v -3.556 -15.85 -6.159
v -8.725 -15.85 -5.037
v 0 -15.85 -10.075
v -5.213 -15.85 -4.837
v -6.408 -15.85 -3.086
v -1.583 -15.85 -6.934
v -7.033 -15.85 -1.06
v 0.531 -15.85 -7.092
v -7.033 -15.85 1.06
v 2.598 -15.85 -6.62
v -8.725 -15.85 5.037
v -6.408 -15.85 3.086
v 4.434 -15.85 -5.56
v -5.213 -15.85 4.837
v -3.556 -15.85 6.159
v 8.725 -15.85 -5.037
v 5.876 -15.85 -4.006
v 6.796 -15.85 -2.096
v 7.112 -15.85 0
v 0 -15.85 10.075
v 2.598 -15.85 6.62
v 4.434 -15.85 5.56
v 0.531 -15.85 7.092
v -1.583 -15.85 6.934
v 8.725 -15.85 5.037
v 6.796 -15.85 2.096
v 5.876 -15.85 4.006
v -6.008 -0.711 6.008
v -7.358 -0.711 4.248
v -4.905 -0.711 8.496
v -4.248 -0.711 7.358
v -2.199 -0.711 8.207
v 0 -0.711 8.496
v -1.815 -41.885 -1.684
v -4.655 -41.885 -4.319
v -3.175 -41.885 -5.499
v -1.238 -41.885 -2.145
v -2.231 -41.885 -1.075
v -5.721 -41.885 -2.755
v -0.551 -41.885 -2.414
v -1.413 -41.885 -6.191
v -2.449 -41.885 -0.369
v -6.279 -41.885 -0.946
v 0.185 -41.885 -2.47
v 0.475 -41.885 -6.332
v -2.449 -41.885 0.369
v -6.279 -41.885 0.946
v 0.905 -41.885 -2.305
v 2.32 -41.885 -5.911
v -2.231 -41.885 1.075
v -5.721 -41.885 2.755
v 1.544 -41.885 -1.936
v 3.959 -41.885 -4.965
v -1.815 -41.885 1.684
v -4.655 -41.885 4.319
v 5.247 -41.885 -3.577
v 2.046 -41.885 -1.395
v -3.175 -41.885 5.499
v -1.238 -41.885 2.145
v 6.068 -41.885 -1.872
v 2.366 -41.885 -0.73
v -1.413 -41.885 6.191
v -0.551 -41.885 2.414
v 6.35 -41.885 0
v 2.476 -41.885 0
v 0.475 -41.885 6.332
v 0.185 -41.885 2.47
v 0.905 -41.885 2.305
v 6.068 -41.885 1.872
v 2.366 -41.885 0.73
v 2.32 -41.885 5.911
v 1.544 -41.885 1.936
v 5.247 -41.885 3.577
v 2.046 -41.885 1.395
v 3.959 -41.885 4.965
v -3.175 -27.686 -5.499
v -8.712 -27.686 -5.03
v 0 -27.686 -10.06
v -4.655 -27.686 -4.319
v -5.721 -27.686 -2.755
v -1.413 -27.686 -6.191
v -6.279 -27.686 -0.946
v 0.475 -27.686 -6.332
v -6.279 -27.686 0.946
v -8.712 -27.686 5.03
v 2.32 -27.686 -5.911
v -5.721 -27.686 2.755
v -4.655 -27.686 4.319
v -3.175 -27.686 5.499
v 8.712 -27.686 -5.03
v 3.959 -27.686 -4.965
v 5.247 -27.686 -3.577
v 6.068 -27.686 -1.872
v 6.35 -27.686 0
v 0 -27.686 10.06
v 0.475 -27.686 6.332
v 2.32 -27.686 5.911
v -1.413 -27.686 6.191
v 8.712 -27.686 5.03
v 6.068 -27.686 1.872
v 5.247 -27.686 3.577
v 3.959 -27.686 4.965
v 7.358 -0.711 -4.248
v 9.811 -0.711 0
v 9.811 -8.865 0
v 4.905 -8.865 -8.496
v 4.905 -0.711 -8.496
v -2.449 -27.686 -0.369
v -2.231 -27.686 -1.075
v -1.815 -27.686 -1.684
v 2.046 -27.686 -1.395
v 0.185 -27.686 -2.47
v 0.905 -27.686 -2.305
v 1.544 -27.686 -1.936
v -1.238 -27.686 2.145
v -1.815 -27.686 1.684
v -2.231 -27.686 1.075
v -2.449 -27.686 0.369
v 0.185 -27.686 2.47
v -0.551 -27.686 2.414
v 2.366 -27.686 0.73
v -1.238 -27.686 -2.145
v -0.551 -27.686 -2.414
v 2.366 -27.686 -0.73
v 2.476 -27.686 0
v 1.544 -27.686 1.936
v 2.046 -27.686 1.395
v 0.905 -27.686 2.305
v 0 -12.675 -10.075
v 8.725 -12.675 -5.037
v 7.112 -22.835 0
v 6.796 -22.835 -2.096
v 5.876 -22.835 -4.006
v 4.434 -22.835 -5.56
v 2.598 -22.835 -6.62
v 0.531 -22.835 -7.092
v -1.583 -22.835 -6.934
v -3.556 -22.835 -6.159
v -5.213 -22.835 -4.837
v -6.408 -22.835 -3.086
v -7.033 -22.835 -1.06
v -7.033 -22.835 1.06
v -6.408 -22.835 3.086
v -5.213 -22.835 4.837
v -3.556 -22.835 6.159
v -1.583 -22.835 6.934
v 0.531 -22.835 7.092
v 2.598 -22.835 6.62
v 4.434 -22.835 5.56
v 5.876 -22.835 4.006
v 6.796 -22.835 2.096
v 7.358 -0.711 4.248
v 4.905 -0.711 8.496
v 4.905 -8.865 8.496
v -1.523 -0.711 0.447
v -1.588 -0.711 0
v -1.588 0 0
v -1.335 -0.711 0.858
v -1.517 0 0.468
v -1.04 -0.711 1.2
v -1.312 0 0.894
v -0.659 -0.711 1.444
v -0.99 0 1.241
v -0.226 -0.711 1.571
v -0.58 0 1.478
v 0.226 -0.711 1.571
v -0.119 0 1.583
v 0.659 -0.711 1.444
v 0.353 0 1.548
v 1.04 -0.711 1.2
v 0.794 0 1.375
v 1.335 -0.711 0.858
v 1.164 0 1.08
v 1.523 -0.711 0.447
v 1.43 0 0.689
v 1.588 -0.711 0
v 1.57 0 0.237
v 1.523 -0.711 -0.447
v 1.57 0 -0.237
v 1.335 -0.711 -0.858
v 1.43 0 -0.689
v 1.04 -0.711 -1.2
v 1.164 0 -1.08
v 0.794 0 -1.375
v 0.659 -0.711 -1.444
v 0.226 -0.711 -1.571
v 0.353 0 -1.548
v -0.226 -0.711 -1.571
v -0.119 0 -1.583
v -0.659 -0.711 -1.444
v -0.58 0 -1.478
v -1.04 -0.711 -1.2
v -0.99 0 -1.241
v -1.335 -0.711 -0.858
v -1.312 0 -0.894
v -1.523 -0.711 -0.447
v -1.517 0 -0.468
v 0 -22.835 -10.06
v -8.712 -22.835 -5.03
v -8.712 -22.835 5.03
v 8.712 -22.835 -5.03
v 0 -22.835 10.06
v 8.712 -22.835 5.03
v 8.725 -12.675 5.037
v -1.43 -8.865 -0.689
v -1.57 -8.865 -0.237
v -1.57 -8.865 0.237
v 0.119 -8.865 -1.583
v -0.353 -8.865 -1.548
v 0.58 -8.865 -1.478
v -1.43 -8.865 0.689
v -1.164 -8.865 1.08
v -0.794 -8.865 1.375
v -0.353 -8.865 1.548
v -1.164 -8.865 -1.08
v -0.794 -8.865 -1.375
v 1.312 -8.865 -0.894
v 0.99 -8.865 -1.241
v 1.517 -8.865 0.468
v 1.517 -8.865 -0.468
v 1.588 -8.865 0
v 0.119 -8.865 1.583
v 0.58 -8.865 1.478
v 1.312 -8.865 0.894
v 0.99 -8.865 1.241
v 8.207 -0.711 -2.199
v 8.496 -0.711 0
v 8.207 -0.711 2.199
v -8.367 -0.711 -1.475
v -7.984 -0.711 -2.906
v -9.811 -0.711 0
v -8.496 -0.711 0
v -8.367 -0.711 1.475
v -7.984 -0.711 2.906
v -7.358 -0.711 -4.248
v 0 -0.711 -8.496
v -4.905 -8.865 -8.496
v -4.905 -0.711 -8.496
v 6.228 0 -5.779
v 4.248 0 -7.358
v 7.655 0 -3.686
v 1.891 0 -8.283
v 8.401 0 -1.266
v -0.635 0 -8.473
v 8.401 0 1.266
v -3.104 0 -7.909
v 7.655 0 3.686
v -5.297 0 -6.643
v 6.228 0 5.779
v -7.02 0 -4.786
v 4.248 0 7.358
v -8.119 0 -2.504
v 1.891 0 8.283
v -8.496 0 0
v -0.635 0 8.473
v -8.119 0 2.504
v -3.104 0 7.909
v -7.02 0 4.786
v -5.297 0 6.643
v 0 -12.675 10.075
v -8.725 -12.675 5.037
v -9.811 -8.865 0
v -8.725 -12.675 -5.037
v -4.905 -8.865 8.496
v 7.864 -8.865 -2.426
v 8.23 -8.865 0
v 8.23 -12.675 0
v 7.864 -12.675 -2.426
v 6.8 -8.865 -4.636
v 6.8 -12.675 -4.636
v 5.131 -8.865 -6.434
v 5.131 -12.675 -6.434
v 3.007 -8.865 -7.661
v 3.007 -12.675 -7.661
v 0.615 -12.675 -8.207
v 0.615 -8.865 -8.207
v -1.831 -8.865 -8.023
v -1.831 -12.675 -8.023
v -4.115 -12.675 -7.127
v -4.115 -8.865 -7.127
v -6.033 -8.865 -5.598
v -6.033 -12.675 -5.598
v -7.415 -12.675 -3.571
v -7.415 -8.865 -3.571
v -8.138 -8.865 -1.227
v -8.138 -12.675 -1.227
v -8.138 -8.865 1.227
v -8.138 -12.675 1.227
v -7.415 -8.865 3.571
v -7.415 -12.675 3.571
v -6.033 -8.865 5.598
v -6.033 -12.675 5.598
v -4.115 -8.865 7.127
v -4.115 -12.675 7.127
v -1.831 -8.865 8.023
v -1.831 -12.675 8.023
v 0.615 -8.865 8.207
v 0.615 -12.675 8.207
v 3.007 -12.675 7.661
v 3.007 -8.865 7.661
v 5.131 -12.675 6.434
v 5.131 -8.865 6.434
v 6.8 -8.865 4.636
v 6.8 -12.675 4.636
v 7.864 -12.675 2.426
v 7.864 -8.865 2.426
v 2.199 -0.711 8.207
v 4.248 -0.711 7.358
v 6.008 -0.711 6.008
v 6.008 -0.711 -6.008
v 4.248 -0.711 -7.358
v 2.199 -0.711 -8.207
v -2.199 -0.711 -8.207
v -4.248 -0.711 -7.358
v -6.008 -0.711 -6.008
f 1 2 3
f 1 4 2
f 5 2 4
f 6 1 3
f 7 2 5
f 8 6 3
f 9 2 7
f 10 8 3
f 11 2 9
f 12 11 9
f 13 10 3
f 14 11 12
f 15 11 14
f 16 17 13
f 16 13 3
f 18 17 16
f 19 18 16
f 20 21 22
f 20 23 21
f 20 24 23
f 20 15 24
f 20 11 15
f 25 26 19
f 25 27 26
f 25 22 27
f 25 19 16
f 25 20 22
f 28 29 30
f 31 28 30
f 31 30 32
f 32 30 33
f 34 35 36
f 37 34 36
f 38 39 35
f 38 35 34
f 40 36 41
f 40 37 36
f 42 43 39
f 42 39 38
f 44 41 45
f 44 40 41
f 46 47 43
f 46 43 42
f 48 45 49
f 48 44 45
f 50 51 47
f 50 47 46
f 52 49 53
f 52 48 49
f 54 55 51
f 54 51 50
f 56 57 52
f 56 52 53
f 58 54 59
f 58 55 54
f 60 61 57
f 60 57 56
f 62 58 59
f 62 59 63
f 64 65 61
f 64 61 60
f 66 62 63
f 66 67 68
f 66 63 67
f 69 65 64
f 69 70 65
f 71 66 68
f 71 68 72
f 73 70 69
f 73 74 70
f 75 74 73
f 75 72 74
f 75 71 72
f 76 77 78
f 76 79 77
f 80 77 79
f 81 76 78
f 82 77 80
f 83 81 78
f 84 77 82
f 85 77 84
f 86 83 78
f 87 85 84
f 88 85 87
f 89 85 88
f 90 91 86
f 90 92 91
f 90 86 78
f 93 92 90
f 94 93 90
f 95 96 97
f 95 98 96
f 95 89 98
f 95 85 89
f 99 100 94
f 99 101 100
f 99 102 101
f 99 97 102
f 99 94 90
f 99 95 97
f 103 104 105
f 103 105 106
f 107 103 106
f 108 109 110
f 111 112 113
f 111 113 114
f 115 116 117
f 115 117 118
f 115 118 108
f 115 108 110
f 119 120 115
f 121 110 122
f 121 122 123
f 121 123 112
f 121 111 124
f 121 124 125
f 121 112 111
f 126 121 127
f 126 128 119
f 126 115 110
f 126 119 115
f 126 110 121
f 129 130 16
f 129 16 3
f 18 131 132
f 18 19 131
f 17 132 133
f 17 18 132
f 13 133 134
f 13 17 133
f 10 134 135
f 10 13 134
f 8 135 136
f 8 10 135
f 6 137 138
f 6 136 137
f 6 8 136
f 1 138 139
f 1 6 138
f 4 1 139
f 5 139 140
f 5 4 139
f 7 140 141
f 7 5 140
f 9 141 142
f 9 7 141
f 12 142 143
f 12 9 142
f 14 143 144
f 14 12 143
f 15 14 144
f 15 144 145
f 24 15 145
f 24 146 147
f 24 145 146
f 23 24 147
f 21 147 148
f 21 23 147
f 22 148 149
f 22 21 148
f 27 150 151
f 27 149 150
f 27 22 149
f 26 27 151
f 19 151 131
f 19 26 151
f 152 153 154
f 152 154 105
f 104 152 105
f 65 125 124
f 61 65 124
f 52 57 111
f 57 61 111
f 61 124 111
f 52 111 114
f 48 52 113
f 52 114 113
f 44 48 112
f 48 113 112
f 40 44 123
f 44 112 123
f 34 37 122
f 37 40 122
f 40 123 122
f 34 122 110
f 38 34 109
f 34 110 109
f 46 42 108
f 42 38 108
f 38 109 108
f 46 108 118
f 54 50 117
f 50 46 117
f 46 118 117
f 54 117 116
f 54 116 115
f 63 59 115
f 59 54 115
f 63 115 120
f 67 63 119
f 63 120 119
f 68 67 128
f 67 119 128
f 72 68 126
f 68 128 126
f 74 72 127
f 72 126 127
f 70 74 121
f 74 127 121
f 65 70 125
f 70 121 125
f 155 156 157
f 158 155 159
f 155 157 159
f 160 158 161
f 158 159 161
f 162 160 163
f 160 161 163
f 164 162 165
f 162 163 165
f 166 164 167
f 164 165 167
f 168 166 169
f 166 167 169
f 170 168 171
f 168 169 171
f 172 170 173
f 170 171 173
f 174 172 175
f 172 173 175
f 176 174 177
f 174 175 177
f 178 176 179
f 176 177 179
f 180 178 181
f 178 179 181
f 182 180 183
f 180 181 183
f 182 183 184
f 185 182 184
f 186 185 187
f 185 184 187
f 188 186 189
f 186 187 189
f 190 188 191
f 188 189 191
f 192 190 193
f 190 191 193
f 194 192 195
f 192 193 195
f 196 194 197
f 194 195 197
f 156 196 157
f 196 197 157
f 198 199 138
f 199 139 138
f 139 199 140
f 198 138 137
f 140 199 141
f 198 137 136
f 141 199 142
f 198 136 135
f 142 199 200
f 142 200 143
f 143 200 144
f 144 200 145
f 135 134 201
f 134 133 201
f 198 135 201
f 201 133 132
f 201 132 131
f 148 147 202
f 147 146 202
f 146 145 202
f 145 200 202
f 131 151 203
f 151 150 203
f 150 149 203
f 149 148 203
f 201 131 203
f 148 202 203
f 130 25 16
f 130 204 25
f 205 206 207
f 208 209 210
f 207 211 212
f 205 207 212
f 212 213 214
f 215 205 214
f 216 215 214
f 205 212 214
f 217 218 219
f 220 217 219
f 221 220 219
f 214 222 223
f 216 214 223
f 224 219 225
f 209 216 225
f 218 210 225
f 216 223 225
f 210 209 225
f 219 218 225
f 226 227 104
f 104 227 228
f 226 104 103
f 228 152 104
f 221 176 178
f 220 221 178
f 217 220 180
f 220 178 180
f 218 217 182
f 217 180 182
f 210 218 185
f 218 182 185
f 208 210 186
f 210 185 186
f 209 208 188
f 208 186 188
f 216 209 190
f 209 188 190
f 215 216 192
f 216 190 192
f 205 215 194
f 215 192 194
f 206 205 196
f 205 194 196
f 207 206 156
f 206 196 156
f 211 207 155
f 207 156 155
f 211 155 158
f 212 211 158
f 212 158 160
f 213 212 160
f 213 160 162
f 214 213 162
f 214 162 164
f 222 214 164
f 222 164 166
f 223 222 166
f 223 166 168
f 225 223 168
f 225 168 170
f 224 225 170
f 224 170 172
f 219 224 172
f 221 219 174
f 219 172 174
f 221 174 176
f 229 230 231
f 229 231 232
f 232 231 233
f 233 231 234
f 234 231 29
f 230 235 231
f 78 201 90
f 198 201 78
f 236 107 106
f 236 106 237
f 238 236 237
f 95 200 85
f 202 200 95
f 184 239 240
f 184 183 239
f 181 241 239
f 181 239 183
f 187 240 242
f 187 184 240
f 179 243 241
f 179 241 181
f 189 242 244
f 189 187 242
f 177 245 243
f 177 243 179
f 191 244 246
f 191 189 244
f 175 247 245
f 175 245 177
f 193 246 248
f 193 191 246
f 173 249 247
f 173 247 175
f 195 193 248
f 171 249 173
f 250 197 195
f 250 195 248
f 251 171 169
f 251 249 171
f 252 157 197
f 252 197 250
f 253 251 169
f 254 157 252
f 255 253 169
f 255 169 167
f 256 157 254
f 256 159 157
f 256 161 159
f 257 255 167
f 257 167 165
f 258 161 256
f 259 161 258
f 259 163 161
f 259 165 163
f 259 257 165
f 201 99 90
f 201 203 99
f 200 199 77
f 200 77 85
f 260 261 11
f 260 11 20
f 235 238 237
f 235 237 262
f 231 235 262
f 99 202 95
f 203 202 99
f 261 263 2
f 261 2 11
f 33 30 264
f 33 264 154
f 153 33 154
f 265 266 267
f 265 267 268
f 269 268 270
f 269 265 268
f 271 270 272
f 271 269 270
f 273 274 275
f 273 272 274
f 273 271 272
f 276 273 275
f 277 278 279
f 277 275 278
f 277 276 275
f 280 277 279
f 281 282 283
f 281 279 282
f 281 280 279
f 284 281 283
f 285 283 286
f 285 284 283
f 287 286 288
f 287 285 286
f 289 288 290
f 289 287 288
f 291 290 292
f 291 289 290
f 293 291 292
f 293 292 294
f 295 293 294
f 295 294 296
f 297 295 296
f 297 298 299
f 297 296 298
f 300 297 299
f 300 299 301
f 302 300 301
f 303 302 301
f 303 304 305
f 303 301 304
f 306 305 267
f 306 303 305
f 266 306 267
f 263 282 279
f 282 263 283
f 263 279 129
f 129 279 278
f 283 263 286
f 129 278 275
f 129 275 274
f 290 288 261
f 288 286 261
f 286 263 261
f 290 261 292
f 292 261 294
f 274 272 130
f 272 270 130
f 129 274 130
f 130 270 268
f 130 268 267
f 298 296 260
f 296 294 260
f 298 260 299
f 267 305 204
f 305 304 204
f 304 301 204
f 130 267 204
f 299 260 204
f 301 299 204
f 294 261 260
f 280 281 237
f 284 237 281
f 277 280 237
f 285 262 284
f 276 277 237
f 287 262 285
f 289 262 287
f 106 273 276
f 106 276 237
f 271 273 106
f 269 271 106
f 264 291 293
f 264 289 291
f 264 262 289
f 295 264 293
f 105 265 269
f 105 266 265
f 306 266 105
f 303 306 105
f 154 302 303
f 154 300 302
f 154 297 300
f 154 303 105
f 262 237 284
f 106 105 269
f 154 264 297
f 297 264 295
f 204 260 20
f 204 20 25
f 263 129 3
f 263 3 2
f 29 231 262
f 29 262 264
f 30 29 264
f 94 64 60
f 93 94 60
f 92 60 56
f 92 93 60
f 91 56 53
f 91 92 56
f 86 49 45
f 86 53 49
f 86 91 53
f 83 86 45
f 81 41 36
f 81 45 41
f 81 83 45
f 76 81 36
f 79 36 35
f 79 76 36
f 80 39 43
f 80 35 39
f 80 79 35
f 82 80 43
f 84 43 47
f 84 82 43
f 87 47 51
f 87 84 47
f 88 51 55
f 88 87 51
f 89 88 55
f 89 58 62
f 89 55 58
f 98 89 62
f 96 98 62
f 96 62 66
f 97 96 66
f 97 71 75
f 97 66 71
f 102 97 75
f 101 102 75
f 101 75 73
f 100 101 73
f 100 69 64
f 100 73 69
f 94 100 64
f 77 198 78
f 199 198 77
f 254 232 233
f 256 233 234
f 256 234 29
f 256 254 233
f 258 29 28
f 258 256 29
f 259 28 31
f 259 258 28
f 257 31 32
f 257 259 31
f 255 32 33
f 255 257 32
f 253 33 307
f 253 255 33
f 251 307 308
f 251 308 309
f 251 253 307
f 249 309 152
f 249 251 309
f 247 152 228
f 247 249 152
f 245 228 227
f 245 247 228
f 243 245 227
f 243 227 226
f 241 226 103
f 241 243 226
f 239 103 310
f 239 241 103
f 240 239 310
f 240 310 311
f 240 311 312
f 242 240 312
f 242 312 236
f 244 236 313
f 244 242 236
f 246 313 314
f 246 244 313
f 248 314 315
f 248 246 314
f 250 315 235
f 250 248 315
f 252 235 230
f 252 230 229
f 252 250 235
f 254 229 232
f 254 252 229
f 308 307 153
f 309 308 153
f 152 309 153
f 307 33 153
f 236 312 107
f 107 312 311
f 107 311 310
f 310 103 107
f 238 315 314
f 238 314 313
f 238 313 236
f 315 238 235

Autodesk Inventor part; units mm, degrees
ref_plane "YZ Plane" through (0, 0, 0) normal (1, 0, 0) x (0, 1, 0)
ref_plane "XZ Plane" through (0, 0, 0) normal (0, 1, 0) x (-1, 0, 0)
ref_plane "XY Plane" through (0, 0, 0) normal (0, 0, 1) x (1, 0, 0)
sketch "Sketch1" plane through (0, 0, 0) normal (0, 1, 0) x (-1, 0, 0)
  circle A0 centre (0, 0) radius 1.5875
  circle A1 centre (0, 0) radius 8.4963
  dimension "d0" = 3.175
  dimension "d1" = 16.9926
extrude "Extrusion1" add sketch "Sketch1" against normal blind 0.7112
sketch "Sketch2" plane through (0, -0.7112, 0) normal (0, -1, 0) x (1, 0, 0)
  circle A0 centre (0, 0) radius 8.4963 construction
  line L0 (4.9053, 8.4963) -> (9.8107, 0)
  line L1 (9.8107, 0) -> (4.9053, -8.4963)
  line L2 (4.9053, -8.4963) -> (-4.9053, -8.4963)
  line L3 (-4.9053, -8.4963) -> (-9.8107, 0)
  line L4 (-9.8107, 0) -> (-4.9053, 8.4963)
  line L5 (-4.9053, 8.4963) -> (4.9053, 8.4963)
  circle A1 centre (0, 0) radius 1.5875 projected
  point P0 (0, 8.4963)
extrude "Extrusion2" add sketch "Sketch2" along normal blind 8.1534
sketch "Sketch3" plane through (0, -8.8646, 0) normal (0, -1, 0) x (1, 0, 0)
  circle A0 centre (0, 0) radius 8.2296
  dimension "d6" = 16.4592
extrude "Extrusion3" add sketch "Sketch3" along normal blind 3.81
sketch "Sketch4" plane through (0, -12.6746, 0) normal (0, -1, 0) x (1, 0, 0)
  circle A0 centre (0, 0) radius 8.7249 construction
  line L0 (8.7249, -5.0373) -> (0, -10.0746)
  line L1 (0, -10.0746) -> (-8.7249, -5.0373)
  line L2 (-8.7249, -5.0373) -> (-8.7249, 5.0373)
  line L3 (-8.7249, 5.0373) -> (0, 10.0746)
  line L4 (0, 10.0746) -> (8.7249, 5.0373)
  line L5 (8.7249, 5.0373) -> (8.7249, -5.0373)
  point P0 (8.7249, 0)
  dimension "d9" = 17.4498
extrude "Extrusion4" add sketch "Sketch4" along normal blind 3.175
sketch "Sketch5" plane through (0, -15.8496, 0) normal (0, -1, 0) x (1, 0, 0)
  circle A0 centre (0, 0) radius 7.112
  dimension "d12" = 14.224
extrude "Extrusion5" add sketch "Sketch5" along normal blind 6.985
sketch "Sketch6" plane through (0, -22.8346, 0) normal (0, -1, 0) x (1, 0, 0)
  circle A0 centre (0, 0) radius 8.7122 construction
  line L0 (8.7122, -5.03) -> (0, -10.06)
  line L1 (0, -10.06) -> (-8.7122, -5.03)
  line L2 (-8.7122, -5.03) -> (-8.7122, 5.03)
  line L3 (-8.7122, 5.03) -> (0, 10.06)
  line L4 (0, 10.06) -> (8.7122, 5.03)
  line L5 (8.7122, 5.03) -> (8.7122, -5.03)
  point P0 (8.7122, 0)
  dimension "d15" = 17.4244
extrude "Extrusion6" add sketch "Sketch6" along normal blind 4.8514
sketch "Sketch7" plane through (0, -27.686, 0) normal (0, -1, 0) x (1, 0, 0)
  circle A0 centre (0, 0) radius 2.4765
  circle A1 centre (0, 0) radius 6.35
  dimension "d18" = 4.953
  dimension "d19" = 12.7
extrude "Extrusion7" add sketch "Sketch7" along normal blind 14.1986
properties part number "am-2002" material "Brass"
